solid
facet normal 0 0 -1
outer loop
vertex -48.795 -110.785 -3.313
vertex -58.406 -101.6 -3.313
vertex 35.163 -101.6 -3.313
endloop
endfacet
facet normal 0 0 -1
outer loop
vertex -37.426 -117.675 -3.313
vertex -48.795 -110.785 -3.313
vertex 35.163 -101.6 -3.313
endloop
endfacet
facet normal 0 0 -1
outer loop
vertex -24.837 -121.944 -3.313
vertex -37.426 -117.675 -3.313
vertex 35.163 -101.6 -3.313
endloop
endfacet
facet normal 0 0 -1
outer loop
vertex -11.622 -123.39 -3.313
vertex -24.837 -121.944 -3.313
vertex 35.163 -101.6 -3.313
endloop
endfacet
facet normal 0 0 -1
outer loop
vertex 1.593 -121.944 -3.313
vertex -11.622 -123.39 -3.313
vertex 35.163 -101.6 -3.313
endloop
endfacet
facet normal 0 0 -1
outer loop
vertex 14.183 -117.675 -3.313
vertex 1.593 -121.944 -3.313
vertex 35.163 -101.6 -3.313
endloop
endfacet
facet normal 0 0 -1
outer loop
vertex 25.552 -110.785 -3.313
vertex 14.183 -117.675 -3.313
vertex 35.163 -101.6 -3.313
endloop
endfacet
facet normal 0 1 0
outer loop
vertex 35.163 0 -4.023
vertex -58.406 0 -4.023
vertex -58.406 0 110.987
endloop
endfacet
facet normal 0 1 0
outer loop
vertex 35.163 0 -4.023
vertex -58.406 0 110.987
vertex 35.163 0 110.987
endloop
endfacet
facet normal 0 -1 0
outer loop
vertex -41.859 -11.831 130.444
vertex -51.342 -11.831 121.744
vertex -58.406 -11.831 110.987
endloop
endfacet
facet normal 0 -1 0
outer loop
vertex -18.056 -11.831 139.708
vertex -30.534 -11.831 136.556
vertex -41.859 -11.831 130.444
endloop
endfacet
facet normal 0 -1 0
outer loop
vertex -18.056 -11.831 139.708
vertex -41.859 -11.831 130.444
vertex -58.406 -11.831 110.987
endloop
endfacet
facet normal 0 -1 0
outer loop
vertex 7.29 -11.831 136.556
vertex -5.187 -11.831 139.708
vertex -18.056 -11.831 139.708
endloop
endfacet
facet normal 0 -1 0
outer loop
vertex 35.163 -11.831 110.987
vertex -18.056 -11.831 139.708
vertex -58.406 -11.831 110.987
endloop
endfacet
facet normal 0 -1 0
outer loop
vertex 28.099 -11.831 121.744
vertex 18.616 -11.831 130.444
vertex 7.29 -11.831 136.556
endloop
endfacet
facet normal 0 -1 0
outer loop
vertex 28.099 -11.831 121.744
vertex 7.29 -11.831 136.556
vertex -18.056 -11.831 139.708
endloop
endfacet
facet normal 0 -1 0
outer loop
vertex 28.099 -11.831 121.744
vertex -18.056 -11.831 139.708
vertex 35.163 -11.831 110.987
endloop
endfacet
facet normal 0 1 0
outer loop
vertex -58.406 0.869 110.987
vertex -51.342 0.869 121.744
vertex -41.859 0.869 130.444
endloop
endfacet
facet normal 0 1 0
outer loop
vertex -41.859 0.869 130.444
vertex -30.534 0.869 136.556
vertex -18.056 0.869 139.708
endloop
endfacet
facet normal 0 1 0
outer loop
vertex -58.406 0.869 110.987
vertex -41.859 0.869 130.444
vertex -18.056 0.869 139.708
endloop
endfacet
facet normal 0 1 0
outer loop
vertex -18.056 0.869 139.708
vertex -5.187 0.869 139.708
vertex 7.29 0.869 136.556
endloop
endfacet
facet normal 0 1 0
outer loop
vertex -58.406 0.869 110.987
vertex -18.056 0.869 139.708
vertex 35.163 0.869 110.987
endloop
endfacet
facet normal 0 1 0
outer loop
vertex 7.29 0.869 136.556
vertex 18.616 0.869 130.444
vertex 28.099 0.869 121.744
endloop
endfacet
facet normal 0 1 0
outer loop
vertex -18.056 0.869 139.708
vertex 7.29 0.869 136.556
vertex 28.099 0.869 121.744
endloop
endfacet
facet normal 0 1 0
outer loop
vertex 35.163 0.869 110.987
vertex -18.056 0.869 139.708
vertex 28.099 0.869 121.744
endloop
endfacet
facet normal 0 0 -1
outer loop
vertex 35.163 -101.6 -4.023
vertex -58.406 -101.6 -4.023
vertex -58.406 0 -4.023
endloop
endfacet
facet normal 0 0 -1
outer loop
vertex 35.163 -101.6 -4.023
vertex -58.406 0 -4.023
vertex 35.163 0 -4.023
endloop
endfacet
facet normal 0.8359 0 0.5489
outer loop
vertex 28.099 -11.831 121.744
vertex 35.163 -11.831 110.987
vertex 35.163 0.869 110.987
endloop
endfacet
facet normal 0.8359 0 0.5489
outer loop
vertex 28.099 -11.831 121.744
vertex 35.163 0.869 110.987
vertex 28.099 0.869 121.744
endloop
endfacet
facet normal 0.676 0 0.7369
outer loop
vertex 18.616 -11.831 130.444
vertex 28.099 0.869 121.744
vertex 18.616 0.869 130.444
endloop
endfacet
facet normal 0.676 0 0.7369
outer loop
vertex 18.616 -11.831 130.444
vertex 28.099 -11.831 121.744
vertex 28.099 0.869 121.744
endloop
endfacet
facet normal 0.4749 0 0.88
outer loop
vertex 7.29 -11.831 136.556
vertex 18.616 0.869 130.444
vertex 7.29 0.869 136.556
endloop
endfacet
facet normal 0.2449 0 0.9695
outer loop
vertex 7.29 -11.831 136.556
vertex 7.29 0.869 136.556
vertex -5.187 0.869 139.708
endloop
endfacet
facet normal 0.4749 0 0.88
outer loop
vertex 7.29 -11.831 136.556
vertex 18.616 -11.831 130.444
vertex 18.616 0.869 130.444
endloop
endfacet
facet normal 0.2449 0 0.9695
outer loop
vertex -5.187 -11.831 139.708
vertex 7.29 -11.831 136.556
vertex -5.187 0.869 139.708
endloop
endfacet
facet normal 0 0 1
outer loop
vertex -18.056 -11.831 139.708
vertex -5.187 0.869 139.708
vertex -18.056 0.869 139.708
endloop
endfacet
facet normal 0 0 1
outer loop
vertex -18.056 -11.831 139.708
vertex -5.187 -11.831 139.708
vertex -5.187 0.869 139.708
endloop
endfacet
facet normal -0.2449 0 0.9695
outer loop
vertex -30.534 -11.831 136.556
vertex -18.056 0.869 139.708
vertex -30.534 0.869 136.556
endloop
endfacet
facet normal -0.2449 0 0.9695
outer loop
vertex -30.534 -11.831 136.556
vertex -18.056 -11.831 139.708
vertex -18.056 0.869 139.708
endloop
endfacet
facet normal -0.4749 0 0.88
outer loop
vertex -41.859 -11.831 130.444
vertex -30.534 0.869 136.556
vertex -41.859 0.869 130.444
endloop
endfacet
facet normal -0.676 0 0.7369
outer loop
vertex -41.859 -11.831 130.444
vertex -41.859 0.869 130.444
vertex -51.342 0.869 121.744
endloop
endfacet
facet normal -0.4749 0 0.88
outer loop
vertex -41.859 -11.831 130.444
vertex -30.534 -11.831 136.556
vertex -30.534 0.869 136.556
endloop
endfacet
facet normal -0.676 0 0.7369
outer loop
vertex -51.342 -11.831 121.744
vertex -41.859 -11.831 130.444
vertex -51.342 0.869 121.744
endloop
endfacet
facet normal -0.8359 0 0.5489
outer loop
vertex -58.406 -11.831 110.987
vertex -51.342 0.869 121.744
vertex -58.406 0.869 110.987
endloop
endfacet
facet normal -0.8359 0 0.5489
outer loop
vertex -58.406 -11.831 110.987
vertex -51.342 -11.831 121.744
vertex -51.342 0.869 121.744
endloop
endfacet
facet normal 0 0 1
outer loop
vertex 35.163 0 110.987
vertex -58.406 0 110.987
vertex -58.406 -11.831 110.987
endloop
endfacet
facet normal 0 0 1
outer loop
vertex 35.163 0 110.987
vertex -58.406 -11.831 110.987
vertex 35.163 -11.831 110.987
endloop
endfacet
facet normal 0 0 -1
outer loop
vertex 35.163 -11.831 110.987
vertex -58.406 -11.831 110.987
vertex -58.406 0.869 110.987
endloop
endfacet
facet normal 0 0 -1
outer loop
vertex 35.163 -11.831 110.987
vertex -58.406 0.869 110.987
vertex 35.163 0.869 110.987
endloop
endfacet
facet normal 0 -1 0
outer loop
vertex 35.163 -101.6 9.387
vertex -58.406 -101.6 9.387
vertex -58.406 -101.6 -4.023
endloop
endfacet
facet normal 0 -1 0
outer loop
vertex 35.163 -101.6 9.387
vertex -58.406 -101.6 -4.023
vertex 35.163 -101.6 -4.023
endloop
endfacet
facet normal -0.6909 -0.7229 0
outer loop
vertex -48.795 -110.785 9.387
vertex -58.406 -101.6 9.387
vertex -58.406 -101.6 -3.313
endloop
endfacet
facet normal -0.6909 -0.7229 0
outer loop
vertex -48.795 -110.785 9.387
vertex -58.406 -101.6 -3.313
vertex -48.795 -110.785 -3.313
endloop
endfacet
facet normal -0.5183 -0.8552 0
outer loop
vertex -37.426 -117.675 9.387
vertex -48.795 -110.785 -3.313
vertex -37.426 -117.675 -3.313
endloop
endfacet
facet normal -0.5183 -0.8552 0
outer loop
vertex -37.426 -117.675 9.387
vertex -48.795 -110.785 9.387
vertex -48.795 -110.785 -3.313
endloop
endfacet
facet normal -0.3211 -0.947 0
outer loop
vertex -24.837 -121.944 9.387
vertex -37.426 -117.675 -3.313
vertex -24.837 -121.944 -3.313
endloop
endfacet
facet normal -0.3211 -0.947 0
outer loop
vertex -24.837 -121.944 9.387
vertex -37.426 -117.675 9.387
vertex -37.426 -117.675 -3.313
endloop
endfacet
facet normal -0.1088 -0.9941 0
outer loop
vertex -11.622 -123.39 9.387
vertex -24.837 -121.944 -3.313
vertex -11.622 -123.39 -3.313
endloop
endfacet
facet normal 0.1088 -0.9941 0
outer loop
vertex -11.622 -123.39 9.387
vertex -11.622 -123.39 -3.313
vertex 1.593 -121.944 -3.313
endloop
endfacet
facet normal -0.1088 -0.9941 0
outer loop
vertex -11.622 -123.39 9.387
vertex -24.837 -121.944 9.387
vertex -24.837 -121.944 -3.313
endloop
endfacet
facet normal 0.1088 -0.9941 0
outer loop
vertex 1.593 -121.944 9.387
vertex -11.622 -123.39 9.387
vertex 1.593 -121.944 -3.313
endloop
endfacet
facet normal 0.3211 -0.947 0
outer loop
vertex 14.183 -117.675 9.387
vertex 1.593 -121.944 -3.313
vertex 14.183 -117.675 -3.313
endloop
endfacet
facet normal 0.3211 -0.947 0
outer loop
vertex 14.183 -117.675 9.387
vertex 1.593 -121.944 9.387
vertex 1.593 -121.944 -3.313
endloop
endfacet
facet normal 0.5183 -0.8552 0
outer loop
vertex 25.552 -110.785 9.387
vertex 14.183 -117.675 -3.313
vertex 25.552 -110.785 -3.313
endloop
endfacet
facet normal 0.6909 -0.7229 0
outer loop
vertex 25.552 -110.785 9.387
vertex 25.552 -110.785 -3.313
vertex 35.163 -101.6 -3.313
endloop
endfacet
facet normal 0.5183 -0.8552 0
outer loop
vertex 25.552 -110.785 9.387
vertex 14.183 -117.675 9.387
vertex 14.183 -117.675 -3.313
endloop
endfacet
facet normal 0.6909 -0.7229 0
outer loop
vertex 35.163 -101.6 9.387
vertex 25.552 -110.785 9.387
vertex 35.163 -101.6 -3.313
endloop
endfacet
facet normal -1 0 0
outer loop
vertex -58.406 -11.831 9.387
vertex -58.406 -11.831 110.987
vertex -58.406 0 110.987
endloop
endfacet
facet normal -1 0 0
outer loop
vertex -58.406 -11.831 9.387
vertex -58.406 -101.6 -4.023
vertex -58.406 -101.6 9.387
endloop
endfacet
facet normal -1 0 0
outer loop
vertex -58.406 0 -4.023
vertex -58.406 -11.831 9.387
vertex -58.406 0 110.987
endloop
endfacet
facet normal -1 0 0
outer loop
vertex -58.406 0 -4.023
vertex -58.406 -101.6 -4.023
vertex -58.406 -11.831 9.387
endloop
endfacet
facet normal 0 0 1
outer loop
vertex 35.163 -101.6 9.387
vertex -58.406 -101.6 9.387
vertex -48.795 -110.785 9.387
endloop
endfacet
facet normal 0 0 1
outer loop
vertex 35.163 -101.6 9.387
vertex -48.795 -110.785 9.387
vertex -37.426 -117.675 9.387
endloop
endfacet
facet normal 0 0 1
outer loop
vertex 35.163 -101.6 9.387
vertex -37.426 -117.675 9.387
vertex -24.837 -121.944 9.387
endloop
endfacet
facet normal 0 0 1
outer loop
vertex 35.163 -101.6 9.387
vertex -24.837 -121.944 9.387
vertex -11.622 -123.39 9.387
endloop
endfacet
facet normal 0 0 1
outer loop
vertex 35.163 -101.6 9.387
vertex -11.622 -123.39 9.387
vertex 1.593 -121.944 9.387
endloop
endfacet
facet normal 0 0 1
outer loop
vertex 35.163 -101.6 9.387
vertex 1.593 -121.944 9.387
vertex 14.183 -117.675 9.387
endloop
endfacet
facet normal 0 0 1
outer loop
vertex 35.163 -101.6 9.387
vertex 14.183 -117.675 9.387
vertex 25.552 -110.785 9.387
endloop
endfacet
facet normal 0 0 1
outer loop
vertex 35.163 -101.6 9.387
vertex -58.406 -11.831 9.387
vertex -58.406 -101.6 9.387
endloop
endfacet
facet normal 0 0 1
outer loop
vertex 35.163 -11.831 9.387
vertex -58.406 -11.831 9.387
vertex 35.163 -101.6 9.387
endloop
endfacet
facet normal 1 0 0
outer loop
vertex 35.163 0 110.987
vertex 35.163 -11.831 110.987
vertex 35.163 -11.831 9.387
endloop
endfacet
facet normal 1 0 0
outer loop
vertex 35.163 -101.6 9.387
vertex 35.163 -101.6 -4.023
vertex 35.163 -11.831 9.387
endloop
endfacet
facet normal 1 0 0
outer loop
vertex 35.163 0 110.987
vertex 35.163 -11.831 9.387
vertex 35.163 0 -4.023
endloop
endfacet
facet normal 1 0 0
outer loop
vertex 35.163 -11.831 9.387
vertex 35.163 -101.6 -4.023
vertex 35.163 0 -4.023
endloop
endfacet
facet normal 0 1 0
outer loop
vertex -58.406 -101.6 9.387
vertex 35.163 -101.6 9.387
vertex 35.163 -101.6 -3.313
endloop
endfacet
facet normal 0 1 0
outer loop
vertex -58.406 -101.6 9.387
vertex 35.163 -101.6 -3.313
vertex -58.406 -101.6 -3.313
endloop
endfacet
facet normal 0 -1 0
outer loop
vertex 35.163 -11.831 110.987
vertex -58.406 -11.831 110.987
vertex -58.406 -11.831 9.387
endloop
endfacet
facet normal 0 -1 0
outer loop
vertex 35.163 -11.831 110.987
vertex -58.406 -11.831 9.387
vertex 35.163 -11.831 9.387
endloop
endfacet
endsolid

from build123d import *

# Parameters (mm, degrees)
F0_W     = 93.5684889555
F0_H     = 13.409497682
F1_DEPTH = 101.6
F2_W     = 93.5684889555
F2_H     = 11.8308644742
F3_DEPTH = 101.6
F5_DEPTH = 12.7
F7_DEPTH = 12.7


with BuildPart() as f1:
    # F0 (on Front) → F1 (new body)
    with BuildSketch(Plane.XZ):
        with Locations((-11.6215646267, 2.681899583)):
            Rectangle(F0_W, F0_H)
    extrude(amount=F1_DEPTH)

    # F2 (on face) → F3 (join)
    with BuildSketch(Plane.XY.offset(9.386648424)):
        with Locations((-11.6215646267, -5.9154322371)):
            Rectangle(F2_W, F2_H)
    extrude(amount=F3_DEPTH)


with BuildPart() as f5:
    # F4 (on face) → F5 (new body)
    with BuildSketch(Plane.XZ.offset(11.8308644742)):
        with BuildLine():
            Line((-58.4058091044, 110.986648424), (35.1626798511, 110.986648424))
            ThreePointArc((35.1626798511, 110.986648424), (-11.6215646267, 140.1063295493), (-58.4058091044, 110.986648424))
        make_face()
    extrude(amount=-F5_DEPTH)


with BuildPart() as f7:
    # F6 (on face) → F7 (new body)
    with BuildSketch(Plane.XY.offset(9.386648424)):
        with BuildLine():
            Line((35.1626798511, -101.6), (-58.4058091044, -101.6))
            ThreePointArc((-58.4058091044, -101.6), (-11.6215646267, -123.3899849422), (35.1626798511, -101.6))
        make_face()
    extrude(amount=-F7_DEPTH)


solid = Compound([f1.part, f5.part, f7.part])
